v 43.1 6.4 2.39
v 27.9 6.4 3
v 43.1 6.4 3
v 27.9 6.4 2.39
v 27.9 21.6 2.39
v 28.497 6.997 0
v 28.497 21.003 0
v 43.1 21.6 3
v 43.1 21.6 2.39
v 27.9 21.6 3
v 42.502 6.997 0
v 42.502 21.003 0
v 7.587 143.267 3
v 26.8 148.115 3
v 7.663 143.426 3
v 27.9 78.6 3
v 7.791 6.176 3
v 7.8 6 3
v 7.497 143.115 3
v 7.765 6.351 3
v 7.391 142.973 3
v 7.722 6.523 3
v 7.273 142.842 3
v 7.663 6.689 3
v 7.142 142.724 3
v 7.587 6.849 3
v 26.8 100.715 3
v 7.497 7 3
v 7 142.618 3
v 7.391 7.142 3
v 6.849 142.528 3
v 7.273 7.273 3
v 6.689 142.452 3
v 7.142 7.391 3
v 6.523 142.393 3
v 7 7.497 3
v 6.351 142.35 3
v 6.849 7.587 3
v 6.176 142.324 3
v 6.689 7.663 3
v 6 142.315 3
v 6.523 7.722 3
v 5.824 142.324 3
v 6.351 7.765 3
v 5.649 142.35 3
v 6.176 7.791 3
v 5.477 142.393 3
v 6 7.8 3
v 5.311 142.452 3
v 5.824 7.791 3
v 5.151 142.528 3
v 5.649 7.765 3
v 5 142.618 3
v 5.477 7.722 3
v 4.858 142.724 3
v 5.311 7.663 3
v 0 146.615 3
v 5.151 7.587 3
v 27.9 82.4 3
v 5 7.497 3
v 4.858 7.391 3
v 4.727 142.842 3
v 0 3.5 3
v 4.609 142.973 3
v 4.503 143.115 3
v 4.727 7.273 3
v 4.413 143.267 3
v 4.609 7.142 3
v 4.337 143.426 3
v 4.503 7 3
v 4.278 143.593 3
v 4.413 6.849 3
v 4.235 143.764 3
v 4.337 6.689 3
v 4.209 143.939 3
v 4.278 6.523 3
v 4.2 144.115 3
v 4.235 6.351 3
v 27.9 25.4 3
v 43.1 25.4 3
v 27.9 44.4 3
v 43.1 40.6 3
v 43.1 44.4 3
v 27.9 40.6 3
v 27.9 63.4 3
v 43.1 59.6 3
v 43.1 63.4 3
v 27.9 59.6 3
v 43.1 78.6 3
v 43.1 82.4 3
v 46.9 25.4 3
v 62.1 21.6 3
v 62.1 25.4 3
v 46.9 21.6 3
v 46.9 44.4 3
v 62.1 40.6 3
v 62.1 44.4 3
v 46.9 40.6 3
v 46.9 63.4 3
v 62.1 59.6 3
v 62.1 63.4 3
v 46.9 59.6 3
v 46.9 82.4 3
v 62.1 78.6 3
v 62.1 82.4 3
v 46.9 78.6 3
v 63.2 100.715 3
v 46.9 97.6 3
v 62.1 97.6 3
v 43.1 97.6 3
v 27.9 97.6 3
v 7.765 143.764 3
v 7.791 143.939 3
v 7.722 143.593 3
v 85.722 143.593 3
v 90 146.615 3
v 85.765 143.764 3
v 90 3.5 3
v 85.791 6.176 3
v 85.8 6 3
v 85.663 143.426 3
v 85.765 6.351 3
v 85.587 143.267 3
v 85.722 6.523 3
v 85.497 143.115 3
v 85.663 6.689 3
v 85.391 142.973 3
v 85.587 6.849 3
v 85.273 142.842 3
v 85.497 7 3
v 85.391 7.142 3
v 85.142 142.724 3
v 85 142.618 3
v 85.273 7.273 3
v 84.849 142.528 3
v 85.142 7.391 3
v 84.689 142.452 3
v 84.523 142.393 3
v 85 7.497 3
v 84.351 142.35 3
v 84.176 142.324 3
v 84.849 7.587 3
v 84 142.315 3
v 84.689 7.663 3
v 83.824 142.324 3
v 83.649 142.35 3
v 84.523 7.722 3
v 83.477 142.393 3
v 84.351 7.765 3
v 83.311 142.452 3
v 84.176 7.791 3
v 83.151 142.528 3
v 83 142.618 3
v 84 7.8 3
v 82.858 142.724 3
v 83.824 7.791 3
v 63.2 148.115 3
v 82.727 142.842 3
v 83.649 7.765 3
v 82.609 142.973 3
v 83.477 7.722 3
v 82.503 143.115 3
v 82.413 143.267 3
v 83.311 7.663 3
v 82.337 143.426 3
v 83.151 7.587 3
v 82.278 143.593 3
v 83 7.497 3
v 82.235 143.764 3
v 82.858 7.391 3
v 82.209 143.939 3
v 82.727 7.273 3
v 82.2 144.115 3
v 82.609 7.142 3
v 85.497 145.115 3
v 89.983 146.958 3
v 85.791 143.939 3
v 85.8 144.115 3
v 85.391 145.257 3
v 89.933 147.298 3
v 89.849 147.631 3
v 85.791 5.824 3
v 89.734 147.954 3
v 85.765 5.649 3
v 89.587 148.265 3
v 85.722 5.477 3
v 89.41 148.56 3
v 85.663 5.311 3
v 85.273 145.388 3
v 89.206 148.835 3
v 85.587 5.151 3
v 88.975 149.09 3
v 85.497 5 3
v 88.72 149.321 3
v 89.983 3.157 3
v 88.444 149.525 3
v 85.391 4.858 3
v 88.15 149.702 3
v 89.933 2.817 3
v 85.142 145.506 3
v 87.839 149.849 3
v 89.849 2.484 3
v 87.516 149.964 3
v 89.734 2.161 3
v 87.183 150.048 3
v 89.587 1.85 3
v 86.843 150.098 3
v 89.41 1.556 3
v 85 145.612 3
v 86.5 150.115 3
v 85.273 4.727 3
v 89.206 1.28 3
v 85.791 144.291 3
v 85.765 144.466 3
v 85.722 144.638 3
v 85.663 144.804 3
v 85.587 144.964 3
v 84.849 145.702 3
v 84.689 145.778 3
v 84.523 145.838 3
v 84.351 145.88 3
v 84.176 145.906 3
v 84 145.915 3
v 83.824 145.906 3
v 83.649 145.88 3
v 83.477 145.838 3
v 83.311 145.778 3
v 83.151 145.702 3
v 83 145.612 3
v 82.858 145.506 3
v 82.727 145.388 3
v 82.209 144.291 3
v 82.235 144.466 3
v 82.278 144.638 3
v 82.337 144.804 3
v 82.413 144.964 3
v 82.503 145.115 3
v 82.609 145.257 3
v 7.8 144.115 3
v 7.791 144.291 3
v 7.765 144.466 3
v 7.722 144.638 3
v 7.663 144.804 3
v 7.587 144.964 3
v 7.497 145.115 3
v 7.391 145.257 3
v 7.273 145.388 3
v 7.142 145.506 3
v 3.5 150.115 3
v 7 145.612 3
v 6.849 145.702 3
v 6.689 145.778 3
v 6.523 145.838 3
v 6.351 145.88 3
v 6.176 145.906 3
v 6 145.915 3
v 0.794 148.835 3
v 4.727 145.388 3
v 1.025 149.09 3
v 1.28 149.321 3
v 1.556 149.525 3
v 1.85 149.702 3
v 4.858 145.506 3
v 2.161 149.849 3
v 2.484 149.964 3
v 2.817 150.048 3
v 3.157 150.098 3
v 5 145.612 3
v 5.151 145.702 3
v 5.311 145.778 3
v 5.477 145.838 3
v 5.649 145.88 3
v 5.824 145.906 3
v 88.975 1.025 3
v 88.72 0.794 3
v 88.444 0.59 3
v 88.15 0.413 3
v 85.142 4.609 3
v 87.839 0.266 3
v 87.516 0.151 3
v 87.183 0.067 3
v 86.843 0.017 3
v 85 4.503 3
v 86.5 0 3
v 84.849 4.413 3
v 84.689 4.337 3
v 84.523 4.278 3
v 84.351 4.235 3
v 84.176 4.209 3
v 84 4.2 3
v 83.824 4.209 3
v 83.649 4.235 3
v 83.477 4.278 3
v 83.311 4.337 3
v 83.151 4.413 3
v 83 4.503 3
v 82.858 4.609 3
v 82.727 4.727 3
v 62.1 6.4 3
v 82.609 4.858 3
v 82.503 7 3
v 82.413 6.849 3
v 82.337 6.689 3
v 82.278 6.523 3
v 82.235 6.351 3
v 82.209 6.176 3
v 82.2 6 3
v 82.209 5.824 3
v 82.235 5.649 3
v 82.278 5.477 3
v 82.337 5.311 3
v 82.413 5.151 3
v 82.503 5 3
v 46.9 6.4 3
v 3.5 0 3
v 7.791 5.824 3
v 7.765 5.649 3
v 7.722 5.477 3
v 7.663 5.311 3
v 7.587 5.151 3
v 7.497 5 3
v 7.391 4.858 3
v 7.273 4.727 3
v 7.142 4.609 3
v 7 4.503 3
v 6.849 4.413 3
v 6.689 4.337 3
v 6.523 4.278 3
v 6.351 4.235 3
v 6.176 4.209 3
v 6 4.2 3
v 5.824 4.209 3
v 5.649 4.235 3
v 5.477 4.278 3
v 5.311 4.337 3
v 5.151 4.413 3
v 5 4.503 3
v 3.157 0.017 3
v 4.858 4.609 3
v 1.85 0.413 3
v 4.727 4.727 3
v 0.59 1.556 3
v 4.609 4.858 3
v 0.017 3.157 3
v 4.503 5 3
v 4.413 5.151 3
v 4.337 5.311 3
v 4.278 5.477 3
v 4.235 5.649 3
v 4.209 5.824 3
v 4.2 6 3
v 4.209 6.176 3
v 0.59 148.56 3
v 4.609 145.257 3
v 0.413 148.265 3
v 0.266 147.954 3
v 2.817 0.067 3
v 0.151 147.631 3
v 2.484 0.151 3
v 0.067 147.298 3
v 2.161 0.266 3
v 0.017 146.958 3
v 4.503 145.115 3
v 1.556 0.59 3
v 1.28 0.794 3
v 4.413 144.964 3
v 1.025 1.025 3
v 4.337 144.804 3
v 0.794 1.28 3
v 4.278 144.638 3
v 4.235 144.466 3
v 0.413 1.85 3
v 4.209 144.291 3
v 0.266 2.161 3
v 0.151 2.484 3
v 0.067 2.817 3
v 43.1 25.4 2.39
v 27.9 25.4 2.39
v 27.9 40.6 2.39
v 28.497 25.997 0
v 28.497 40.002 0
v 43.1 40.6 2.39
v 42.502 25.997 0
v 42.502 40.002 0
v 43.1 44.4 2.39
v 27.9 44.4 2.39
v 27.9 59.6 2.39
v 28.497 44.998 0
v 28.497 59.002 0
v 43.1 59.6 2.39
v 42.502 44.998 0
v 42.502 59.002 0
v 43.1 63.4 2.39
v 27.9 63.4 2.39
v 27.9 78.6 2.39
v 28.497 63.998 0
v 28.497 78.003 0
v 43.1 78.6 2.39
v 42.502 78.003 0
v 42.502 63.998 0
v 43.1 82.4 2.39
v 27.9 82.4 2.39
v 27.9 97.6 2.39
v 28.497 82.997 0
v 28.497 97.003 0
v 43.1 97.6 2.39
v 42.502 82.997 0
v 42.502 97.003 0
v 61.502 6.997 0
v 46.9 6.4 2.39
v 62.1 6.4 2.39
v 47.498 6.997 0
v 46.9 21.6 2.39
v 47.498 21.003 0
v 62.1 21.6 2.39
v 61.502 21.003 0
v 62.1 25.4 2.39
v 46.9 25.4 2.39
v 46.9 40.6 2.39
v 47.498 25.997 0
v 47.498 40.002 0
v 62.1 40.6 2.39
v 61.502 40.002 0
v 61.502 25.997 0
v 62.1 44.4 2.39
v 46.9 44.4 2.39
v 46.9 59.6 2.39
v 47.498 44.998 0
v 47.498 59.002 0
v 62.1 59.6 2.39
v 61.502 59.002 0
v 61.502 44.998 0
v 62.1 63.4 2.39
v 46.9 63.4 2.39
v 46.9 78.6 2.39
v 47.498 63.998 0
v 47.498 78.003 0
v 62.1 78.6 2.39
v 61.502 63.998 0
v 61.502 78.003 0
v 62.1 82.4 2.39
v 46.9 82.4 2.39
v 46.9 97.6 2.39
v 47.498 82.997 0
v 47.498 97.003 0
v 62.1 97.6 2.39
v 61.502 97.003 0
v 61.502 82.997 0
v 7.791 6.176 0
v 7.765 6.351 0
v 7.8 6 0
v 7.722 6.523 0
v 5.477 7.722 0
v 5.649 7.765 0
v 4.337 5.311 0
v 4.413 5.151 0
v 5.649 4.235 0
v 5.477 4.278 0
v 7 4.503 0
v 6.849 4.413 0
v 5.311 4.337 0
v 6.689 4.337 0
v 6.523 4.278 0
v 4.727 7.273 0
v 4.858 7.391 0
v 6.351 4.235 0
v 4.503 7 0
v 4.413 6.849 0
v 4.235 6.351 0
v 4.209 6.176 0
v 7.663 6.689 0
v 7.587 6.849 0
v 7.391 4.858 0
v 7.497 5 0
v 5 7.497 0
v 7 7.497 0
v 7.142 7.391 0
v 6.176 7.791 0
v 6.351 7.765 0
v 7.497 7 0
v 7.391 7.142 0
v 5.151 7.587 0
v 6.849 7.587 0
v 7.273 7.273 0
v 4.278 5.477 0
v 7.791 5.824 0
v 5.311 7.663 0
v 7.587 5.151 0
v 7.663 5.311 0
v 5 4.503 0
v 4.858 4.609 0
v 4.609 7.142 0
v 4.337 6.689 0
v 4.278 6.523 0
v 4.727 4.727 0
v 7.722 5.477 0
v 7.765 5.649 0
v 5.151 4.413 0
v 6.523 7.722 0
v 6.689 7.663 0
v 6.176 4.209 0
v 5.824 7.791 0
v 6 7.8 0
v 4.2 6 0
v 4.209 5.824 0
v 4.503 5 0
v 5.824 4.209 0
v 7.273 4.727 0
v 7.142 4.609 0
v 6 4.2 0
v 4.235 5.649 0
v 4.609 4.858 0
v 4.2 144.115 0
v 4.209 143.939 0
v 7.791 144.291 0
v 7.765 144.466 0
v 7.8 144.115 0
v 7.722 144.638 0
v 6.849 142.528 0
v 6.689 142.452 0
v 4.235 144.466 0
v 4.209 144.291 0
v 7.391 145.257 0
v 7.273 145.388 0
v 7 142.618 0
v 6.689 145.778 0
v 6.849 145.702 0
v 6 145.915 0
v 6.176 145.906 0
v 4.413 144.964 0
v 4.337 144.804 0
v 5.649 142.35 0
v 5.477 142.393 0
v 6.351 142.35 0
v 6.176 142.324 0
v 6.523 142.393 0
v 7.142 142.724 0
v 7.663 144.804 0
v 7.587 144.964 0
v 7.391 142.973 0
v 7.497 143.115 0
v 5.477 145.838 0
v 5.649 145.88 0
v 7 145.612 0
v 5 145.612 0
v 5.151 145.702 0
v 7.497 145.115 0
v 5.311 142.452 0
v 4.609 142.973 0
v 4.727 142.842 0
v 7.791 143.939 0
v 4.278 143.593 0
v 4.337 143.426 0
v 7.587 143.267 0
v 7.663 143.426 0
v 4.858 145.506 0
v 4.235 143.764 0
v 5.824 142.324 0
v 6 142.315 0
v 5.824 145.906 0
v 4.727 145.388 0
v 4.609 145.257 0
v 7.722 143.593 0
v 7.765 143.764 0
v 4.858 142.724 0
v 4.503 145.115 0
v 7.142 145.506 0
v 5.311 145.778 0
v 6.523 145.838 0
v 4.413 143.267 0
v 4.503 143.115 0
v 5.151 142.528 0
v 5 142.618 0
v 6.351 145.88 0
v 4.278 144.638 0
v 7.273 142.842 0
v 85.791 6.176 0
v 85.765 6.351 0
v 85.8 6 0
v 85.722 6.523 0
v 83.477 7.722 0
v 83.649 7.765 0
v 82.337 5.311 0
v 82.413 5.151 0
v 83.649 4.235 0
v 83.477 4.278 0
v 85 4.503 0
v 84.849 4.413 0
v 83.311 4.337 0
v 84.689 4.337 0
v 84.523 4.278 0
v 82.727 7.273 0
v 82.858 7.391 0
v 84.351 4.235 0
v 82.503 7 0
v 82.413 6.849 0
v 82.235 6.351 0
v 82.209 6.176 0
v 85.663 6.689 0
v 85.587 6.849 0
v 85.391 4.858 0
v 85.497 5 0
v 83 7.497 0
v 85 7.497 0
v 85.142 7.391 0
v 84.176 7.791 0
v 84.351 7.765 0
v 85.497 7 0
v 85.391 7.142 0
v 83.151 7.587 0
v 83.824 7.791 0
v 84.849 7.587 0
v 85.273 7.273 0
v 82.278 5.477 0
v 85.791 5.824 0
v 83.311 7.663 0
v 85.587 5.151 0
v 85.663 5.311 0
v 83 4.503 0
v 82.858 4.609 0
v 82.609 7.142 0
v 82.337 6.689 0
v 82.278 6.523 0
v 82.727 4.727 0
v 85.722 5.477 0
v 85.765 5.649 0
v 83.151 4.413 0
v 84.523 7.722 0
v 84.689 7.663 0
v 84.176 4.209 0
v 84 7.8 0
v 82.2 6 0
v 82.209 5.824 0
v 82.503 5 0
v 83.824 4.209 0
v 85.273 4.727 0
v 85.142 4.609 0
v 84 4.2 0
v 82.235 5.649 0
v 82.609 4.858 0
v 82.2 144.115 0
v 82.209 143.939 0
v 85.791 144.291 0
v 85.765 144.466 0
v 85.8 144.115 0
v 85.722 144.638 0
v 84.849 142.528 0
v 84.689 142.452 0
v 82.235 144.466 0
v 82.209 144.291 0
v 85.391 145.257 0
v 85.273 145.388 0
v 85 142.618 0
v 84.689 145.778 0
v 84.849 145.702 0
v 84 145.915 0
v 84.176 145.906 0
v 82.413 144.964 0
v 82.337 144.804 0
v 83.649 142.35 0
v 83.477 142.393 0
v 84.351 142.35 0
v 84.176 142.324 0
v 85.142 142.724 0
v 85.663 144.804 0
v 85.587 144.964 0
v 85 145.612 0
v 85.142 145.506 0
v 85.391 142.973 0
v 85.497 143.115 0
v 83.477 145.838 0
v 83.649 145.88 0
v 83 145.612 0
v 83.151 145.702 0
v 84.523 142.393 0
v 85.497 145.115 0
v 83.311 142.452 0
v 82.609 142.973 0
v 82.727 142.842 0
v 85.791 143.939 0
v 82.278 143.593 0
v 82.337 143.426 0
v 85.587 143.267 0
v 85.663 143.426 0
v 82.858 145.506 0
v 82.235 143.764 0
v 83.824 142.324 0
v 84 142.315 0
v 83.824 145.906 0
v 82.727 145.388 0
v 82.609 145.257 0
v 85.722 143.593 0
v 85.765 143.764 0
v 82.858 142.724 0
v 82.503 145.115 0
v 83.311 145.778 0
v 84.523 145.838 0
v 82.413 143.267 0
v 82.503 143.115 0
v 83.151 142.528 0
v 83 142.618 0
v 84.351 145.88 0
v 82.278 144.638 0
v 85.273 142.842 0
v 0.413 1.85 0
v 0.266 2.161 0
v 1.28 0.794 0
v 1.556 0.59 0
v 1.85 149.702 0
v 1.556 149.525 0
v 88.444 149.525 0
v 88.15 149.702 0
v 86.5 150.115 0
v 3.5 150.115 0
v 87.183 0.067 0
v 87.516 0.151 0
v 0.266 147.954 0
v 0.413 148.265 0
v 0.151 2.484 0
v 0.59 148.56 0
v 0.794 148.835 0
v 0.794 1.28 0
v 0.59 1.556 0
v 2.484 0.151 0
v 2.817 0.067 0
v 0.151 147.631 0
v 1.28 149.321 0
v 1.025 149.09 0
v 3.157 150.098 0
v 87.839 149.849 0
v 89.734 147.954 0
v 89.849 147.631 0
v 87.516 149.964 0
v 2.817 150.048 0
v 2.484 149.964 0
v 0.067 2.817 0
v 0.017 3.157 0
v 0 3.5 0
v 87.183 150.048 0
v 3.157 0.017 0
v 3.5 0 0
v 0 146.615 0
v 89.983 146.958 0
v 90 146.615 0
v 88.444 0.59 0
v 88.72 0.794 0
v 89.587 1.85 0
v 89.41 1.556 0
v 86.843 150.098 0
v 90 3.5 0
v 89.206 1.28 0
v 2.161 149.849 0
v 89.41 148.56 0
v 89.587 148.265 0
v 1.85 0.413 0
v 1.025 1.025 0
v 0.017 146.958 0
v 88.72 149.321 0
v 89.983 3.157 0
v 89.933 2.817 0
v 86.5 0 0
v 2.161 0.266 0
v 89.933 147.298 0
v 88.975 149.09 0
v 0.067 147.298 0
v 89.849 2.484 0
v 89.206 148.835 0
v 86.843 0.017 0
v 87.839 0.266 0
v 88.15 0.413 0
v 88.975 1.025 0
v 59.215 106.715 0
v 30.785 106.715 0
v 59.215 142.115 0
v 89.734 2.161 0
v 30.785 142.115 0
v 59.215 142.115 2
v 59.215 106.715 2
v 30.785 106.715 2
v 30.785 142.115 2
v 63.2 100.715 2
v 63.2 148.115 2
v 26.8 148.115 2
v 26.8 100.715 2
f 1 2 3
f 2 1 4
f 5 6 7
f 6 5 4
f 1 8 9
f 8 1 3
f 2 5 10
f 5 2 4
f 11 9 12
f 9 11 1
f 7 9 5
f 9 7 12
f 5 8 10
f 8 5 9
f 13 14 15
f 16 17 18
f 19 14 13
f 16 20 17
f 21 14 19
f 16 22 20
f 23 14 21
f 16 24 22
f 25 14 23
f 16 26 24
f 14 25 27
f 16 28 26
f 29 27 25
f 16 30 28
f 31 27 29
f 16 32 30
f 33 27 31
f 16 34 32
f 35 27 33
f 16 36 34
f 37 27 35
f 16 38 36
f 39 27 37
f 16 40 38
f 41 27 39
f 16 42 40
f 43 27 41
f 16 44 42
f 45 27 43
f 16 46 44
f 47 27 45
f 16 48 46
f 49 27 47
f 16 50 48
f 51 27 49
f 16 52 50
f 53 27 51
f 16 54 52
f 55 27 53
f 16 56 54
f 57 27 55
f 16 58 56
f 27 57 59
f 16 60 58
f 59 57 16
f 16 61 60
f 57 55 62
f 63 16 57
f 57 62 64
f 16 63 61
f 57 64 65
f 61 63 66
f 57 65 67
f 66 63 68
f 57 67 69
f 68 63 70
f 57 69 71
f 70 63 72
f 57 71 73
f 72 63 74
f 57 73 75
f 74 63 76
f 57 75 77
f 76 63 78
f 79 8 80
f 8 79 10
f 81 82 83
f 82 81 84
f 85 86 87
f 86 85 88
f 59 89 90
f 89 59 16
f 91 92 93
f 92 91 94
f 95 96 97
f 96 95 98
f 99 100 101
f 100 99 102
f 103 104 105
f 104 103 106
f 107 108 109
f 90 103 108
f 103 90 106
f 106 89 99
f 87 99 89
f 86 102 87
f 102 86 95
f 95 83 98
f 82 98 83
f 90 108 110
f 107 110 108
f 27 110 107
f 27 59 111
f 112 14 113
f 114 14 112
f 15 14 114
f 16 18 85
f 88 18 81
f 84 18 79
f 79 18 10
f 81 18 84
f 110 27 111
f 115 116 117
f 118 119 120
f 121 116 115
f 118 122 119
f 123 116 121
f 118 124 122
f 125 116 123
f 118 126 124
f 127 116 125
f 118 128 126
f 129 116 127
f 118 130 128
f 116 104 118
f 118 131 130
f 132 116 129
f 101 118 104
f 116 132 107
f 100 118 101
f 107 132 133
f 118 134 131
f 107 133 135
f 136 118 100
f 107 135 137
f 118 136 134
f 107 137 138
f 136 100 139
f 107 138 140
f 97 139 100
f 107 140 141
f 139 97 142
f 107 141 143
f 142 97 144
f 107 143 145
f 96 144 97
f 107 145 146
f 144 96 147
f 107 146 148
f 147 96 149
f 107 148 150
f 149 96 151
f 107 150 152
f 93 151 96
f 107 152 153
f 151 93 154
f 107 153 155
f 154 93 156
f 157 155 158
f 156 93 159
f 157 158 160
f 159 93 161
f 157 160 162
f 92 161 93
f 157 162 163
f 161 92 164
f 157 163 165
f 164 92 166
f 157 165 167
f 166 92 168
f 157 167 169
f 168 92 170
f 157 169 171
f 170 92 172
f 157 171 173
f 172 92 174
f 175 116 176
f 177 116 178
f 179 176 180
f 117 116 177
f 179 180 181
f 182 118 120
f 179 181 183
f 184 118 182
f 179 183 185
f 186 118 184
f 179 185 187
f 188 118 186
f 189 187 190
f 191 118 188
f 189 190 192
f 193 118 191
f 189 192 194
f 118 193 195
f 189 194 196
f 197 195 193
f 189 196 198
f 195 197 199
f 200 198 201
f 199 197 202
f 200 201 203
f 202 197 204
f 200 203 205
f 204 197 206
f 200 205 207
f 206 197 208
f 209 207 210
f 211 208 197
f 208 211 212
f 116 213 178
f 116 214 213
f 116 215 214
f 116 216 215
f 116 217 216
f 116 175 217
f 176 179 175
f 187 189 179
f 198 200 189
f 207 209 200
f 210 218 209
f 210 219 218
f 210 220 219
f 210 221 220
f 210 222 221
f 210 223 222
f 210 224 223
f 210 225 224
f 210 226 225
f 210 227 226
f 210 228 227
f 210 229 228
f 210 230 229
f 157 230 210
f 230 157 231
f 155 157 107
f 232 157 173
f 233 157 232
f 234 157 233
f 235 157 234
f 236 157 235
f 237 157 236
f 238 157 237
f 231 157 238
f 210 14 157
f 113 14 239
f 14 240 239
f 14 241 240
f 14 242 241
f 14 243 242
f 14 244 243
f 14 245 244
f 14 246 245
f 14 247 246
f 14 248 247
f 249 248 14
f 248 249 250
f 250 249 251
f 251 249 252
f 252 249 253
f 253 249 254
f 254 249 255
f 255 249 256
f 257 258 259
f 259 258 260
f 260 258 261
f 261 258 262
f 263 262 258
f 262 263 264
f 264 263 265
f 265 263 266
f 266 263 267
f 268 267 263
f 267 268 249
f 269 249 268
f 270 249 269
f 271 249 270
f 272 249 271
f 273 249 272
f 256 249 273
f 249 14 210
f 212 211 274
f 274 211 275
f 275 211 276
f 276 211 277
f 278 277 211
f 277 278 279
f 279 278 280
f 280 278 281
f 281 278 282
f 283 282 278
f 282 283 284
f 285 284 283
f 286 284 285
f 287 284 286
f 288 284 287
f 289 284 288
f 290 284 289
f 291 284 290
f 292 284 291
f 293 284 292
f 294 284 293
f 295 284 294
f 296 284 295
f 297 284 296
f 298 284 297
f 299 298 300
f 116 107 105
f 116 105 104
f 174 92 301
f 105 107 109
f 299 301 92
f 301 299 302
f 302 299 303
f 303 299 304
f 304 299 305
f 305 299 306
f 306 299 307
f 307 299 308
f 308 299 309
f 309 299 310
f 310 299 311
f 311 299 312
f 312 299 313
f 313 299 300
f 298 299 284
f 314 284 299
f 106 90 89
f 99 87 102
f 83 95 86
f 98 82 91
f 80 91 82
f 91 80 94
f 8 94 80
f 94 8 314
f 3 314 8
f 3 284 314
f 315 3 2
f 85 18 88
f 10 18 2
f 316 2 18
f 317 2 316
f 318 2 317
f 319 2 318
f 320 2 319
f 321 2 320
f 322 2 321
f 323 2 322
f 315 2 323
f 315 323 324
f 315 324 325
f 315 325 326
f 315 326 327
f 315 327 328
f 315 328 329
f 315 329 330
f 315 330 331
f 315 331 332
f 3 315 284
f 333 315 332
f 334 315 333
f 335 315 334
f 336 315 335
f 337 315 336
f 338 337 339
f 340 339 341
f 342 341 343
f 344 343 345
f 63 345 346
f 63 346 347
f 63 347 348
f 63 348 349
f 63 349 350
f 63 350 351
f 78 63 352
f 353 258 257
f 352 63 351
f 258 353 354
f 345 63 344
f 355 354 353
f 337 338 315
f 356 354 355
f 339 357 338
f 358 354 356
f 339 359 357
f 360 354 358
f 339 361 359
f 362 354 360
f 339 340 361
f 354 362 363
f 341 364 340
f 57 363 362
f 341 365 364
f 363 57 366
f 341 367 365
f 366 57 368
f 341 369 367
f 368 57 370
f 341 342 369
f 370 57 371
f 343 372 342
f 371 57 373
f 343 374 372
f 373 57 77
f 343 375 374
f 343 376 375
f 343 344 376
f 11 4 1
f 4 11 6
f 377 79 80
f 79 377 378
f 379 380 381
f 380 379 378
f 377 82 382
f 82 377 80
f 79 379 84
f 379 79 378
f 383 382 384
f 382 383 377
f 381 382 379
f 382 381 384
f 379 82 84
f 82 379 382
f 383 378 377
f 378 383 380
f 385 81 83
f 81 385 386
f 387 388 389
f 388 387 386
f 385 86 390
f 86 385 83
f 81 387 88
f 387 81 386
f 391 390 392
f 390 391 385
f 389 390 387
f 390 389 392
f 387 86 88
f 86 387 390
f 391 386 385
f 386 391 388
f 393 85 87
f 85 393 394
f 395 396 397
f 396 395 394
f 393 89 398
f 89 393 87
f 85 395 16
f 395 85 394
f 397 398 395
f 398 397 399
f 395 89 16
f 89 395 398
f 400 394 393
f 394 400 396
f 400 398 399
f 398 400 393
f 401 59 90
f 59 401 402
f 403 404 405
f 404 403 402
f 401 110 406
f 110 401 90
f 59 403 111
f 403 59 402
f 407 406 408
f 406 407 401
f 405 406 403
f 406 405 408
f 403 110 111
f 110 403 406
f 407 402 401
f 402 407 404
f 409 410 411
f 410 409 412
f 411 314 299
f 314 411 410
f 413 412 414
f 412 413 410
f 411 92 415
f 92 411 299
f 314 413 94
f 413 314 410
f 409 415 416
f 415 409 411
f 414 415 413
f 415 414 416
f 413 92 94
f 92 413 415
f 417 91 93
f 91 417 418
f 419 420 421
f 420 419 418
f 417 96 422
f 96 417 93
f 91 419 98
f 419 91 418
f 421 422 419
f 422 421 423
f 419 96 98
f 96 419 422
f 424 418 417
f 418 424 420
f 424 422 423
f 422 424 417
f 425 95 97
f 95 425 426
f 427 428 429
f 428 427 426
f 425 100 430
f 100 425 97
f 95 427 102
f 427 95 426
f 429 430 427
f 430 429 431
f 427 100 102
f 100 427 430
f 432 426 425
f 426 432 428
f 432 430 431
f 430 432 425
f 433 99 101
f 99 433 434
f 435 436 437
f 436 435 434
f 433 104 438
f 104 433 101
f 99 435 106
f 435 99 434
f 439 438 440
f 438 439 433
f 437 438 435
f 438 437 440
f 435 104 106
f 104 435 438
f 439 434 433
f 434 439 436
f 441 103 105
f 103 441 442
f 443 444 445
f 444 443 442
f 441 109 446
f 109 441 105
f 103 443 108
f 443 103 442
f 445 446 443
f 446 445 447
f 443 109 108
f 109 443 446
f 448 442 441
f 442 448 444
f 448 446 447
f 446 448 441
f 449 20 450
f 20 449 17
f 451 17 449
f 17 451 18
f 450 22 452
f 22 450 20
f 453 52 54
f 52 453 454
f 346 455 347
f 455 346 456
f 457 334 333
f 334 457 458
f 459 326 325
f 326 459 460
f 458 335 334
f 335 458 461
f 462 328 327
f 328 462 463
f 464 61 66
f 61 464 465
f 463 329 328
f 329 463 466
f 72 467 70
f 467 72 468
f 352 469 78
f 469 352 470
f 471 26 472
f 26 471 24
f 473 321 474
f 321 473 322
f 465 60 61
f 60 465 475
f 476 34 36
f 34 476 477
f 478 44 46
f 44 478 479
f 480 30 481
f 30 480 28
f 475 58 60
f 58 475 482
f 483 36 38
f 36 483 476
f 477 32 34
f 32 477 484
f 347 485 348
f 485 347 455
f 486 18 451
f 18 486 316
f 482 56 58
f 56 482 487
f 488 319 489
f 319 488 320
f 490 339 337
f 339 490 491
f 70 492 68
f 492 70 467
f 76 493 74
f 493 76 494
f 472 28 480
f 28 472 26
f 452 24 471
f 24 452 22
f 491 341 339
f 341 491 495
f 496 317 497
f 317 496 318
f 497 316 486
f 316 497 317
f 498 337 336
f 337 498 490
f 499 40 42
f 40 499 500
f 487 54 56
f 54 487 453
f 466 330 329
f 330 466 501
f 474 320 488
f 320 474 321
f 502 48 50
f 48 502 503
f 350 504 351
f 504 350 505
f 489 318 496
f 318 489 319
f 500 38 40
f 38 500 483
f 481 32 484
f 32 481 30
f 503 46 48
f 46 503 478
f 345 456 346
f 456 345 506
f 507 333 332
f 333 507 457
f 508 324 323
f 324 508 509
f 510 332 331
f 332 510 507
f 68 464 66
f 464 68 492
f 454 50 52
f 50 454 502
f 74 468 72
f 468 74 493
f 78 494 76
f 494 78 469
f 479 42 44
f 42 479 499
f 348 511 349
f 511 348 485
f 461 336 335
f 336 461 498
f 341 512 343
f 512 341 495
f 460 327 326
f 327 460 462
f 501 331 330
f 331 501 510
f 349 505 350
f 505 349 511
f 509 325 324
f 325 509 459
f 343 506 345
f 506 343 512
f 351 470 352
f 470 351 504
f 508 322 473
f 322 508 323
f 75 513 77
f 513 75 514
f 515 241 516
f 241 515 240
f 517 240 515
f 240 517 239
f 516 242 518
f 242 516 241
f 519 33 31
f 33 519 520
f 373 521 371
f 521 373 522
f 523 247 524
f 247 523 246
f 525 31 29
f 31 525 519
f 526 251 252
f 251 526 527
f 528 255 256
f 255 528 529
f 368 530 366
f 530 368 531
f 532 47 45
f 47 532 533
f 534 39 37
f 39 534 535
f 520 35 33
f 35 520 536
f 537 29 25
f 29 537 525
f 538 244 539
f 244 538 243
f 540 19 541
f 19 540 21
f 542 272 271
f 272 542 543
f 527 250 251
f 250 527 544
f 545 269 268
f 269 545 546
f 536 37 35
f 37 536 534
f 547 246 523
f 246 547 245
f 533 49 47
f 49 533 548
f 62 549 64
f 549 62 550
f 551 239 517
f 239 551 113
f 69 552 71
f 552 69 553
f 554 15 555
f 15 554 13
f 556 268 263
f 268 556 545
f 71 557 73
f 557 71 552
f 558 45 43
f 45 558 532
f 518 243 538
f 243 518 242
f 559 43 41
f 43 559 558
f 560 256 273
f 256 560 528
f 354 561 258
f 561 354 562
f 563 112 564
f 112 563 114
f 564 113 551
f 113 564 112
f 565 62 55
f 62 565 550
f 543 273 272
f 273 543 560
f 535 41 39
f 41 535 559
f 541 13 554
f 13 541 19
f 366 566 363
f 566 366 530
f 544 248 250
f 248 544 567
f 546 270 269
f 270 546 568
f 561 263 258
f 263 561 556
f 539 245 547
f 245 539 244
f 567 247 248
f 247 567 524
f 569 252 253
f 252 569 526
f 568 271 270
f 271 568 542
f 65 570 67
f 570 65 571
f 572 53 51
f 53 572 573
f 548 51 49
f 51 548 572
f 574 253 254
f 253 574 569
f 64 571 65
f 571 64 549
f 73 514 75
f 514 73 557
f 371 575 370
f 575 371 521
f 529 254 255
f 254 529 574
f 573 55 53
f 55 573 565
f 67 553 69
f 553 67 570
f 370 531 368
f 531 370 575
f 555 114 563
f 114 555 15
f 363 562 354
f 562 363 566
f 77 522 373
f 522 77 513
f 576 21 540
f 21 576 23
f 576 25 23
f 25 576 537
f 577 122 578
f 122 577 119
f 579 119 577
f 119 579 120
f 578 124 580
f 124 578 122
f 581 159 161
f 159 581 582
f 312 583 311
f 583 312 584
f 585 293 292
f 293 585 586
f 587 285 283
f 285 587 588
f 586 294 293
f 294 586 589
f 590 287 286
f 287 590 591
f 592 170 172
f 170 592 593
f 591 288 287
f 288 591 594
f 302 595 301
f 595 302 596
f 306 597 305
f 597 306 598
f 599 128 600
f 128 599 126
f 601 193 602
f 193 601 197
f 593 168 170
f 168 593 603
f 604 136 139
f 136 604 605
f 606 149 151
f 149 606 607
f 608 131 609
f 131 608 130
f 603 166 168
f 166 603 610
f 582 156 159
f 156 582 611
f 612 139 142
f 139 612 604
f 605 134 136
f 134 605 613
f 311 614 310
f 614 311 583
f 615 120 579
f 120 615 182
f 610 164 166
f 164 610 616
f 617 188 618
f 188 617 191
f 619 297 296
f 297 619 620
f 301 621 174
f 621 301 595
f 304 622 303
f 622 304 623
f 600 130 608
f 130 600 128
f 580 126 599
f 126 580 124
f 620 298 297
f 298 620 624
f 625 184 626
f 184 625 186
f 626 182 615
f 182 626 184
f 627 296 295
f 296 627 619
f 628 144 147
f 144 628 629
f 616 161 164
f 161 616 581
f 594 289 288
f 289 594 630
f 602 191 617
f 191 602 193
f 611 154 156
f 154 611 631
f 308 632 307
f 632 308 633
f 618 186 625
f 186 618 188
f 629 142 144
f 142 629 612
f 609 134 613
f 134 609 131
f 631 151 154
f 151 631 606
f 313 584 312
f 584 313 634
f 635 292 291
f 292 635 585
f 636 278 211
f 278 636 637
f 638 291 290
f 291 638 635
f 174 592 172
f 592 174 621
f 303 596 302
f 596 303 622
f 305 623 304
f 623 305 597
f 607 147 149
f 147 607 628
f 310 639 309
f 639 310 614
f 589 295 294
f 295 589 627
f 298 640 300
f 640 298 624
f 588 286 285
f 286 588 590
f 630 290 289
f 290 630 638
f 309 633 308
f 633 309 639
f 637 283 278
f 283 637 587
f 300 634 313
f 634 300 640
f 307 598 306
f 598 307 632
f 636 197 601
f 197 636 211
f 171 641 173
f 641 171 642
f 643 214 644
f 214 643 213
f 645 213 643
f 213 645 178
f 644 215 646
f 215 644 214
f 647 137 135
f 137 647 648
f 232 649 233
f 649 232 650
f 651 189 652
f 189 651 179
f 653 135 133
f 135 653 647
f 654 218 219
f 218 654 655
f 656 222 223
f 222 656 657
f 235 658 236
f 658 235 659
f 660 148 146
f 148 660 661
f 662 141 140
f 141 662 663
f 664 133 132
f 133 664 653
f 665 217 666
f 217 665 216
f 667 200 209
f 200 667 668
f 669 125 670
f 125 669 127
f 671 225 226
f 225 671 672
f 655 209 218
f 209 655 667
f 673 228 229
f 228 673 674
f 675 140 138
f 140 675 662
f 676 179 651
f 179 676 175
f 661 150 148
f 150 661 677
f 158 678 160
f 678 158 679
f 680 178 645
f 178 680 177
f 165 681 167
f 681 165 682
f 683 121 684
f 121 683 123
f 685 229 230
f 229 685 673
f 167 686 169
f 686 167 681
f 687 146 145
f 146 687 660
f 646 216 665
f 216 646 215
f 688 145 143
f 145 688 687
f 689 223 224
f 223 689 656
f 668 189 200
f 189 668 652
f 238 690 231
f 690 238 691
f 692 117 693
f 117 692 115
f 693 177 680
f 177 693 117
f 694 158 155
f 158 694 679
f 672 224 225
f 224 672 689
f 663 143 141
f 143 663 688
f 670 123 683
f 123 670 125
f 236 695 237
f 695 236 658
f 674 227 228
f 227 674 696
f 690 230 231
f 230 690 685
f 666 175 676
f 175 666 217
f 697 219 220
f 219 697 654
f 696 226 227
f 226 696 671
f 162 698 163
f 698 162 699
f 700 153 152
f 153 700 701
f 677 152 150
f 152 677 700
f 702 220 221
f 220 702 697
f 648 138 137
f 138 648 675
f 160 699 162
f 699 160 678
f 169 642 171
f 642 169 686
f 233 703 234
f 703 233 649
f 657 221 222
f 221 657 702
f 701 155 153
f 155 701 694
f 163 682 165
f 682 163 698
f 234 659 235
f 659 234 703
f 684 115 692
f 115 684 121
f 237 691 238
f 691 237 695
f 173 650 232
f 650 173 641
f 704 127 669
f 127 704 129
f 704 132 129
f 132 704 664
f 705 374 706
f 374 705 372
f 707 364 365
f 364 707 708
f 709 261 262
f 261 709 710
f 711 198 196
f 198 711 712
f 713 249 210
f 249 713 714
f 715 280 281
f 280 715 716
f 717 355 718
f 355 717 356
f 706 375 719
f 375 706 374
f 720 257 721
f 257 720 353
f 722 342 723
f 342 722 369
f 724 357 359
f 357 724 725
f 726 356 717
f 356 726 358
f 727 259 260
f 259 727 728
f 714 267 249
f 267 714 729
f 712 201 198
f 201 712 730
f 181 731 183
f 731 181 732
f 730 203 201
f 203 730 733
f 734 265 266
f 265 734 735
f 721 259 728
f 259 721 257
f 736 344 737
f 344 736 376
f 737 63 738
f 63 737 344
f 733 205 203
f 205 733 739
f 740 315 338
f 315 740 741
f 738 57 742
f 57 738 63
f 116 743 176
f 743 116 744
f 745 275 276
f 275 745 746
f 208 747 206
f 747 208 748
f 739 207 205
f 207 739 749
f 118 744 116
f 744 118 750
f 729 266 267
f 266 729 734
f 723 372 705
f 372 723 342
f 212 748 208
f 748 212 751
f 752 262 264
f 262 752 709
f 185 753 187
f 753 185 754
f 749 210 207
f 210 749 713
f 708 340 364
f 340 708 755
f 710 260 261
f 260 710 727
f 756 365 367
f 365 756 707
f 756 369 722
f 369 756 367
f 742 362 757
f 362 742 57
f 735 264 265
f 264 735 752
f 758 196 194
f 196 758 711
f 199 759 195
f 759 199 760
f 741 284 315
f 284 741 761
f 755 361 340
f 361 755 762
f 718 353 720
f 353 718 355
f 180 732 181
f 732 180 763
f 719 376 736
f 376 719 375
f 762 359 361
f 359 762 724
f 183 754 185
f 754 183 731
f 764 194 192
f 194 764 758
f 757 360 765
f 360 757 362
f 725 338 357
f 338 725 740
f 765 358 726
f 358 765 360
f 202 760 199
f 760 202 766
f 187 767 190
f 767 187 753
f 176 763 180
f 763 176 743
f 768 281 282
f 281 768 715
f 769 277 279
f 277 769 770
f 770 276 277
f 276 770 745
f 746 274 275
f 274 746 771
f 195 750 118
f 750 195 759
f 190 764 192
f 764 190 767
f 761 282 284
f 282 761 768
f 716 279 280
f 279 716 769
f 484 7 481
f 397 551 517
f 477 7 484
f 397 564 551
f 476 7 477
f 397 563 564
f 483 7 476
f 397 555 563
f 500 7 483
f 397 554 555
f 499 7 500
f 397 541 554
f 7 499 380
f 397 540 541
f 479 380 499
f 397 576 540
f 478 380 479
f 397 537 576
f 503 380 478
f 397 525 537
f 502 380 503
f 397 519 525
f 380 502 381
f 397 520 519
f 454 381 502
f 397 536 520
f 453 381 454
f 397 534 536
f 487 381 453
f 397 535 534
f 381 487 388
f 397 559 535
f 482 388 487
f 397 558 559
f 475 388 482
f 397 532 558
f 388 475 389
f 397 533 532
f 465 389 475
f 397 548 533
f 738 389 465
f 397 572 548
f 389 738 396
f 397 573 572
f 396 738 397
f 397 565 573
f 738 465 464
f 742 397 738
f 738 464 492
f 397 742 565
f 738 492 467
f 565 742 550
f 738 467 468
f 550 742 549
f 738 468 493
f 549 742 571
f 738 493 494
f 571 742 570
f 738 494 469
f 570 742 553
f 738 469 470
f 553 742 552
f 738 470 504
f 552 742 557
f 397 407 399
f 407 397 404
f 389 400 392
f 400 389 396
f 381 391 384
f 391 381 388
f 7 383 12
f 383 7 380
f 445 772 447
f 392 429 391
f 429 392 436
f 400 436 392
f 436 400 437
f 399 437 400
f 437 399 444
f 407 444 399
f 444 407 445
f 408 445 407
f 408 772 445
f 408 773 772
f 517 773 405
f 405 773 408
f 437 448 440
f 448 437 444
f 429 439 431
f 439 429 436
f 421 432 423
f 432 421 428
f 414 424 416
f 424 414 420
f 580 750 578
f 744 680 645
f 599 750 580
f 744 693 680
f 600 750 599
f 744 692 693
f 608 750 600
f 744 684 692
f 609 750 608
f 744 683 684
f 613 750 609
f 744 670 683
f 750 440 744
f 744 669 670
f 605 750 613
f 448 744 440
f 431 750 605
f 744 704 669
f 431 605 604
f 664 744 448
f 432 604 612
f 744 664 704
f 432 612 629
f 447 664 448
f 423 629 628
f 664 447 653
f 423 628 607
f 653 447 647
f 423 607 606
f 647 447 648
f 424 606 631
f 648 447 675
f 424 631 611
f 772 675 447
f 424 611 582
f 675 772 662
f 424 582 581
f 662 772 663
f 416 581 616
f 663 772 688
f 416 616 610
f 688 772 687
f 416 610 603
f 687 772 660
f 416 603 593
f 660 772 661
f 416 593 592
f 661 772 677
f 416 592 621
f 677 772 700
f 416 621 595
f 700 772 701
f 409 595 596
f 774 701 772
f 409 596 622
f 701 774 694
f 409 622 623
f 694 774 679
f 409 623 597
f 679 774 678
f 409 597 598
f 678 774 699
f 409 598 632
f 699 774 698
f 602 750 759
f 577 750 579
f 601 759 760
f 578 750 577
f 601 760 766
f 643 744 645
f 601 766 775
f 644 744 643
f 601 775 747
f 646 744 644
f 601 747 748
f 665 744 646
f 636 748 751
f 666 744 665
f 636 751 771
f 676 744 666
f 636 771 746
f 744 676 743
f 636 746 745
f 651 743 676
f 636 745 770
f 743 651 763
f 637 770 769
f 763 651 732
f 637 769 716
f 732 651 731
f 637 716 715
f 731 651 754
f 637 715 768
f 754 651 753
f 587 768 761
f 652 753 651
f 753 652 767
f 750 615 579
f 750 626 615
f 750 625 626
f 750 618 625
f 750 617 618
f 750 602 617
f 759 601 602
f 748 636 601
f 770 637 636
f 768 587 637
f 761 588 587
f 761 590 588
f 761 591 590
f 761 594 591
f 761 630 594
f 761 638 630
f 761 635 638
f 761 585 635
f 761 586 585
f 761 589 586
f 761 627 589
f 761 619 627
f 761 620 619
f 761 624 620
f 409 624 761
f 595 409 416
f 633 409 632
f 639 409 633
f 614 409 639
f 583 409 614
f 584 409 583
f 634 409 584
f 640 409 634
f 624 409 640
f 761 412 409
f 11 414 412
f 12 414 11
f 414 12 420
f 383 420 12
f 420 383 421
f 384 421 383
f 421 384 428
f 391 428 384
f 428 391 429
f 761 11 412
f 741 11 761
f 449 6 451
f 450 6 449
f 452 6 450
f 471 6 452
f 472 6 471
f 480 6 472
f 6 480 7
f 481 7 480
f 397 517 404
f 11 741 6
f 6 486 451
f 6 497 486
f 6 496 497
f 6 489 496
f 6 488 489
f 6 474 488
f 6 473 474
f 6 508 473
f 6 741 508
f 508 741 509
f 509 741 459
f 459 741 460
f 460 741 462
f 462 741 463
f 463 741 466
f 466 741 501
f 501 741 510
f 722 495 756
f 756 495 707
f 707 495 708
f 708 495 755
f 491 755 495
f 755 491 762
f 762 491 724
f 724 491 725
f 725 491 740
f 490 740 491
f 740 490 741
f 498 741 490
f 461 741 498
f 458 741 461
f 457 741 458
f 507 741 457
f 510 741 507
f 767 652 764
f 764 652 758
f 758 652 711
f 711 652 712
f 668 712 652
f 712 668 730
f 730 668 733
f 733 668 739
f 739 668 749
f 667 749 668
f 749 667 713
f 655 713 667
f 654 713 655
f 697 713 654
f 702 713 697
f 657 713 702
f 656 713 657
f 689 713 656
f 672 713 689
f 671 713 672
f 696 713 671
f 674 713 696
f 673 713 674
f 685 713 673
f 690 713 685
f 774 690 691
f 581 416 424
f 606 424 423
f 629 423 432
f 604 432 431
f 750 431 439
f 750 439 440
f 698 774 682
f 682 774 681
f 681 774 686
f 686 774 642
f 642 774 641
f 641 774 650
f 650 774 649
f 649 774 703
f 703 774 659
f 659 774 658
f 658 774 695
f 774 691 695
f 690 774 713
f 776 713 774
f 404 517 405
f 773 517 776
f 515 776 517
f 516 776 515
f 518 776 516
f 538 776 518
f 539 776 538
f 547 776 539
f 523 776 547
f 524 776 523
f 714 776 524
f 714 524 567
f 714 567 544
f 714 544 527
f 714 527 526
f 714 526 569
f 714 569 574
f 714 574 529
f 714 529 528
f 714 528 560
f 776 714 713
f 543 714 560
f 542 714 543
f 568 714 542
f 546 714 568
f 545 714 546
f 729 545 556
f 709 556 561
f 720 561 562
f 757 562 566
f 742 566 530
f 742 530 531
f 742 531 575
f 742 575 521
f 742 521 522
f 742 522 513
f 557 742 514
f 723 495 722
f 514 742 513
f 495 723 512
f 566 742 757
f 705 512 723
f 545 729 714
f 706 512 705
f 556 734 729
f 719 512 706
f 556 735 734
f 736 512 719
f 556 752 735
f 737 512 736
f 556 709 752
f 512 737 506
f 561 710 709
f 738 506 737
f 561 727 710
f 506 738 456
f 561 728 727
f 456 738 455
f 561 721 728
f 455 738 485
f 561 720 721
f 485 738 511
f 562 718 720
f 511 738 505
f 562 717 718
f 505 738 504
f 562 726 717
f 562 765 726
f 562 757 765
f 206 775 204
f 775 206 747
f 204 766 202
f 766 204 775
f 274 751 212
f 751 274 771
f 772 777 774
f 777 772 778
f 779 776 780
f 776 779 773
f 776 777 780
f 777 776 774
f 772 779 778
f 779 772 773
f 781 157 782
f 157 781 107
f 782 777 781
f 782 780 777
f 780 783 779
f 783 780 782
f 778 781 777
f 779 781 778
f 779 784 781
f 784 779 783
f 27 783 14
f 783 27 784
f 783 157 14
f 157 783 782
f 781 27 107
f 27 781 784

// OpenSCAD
// =============================================================
//  Streamdeck-v1  –  Faceplate (standalone print file)
//  Print face-down for best hole accuracy.
//
//  All geometry lives in streamdeck_enclosure.scad.
//  Open THAT file to adjust parameters.
// =============================================================

use <streamdeck_enclosure.scad>

faceplate();
